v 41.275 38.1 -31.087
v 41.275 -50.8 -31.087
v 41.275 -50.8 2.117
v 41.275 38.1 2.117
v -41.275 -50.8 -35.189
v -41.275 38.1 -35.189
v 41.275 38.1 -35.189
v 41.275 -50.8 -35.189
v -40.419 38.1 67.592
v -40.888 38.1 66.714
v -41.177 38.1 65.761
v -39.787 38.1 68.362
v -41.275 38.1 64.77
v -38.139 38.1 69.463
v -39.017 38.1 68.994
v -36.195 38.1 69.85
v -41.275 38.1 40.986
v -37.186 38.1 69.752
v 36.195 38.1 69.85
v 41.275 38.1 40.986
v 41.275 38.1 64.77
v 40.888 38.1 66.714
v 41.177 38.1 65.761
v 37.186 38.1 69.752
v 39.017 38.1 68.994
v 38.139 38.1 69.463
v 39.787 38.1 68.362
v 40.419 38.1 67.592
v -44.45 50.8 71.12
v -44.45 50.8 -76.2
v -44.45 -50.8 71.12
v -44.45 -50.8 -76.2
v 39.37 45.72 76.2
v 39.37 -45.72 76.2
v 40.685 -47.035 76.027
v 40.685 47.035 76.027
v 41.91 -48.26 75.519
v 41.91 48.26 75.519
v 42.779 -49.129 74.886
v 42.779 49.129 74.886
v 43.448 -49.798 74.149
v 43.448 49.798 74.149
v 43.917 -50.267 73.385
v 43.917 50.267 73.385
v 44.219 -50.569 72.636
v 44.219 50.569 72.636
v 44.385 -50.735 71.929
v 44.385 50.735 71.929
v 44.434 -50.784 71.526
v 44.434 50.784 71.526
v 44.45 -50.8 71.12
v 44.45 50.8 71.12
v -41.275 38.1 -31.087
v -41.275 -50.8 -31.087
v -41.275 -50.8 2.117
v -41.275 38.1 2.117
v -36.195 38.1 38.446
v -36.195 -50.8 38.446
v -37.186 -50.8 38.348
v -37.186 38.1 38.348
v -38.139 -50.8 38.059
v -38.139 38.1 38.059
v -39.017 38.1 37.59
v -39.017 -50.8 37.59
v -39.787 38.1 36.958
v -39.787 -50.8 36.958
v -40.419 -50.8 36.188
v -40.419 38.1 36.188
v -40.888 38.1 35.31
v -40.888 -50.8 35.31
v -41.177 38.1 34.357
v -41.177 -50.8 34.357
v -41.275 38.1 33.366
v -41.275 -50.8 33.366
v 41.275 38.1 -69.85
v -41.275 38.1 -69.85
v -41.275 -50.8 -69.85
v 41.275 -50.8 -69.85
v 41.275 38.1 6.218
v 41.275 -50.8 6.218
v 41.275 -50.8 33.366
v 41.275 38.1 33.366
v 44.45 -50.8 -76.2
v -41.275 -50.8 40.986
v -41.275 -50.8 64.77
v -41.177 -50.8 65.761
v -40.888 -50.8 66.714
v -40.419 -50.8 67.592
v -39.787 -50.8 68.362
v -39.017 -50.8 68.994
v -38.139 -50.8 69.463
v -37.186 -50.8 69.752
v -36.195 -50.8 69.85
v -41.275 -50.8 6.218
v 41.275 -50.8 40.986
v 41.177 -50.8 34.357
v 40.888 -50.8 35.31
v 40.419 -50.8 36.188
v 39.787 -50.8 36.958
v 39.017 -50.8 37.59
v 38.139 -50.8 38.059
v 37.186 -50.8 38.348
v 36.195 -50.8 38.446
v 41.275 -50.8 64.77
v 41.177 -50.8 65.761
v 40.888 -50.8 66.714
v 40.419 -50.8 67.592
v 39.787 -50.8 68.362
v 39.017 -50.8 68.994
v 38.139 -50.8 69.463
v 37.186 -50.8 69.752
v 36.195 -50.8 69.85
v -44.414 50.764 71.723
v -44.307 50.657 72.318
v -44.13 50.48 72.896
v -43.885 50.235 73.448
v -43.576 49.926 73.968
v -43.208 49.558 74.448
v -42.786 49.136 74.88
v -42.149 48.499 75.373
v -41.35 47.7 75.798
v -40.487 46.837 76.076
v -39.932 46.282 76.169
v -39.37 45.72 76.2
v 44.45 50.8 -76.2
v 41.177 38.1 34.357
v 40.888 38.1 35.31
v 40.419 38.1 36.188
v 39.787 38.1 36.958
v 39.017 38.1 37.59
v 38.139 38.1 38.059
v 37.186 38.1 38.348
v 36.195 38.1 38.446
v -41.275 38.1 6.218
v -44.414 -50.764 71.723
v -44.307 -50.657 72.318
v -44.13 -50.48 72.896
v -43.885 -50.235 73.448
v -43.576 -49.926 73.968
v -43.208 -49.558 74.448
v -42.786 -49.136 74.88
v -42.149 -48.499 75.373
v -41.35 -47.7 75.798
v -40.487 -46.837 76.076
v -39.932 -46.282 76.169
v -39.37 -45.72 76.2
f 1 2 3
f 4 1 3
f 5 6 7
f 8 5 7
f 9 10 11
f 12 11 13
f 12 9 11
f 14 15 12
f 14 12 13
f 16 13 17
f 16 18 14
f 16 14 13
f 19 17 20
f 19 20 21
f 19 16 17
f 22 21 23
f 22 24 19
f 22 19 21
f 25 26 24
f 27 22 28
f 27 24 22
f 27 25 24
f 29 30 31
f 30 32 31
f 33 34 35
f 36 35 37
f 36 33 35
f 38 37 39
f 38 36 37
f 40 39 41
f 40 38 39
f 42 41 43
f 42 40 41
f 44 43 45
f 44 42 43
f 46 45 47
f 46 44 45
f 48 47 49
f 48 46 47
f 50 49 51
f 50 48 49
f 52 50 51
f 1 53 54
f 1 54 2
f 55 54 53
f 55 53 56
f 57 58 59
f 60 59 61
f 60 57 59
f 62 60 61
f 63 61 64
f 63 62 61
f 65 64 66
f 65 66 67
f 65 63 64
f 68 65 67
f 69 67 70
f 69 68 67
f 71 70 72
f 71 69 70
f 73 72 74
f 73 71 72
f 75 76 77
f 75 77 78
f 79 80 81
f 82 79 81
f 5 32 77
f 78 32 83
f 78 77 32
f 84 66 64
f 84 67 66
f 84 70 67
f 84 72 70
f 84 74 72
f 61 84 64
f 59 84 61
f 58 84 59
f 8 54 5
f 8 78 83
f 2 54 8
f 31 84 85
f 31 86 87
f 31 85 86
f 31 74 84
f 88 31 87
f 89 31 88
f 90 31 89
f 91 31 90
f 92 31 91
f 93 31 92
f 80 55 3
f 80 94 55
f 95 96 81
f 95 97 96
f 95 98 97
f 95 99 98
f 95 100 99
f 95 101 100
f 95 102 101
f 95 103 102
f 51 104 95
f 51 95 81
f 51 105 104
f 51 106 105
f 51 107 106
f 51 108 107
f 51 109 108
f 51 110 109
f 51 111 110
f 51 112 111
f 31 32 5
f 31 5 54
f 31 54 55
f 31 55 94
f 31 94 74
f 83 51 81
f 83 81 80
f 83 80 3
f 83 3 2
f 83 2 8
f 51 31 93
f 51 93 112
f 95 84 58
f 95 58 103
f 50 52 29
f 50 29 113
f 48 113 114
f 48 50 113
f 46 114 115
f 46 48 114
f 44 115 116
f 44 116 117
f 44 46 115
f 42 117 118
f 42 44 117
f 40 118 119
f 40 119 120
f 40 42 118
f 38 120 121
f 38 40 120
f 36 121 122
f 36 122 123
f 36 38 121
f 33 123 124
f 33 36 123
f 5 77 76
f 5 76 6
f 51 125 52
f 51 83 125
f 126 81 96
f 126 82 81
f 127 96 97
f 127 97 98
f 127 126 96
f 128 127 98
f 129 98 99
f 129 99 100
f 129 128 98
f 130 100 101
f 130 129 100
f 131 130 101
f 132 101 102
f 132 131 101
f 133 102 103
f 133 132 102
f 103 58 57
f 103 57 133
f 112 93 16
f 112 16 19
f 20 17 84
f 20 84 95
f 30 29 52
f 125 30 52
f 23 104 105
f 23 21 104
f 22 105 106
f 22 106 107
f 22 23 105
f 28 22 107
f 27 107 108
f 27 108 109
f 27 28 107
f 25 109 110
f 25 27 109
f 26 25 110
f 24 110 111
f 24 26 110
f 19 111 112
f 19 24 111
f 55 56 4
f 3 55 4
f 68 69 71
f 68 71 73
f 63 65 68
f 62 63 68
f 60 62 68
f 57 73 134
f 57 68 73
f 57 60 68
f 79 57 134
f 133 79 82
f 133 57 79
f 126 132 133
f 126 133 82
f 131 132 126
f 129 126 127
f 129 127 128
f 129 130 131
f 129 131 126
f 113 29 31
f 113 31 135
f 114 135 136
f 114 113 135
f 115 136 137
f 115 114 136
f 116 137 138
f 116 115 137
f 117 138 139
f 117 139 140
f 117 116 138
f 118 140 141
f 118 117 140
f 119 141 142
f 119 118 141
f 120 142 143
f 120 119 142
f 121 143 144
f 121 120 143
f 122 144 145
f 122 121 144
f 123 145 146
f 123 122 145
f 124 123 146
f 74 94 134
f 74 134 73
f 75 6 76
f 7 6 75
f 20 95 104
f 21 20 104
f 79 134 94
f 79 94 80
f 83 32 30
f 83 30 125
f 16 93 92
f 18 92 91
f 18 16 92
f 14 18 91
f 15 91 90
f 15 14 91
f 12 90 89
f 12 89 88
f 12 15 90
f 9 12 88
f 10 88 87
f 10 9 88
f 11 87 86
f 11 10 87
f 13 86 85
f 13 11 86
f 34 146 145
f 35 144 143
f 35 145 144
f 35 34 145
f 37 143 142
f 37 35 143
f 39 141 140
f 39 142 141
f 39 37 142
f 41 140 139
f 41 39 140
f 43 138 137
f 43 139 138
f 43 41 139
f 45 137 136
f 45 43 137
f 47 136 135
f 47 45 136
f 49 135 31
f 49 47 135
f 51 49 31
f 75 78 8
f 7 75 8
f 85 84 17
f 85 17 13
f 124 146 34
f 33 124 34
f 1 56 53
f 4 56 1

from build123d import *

# Parameters (mm, degrees)
F0_W     = 88.9
F0_H     = 152.4
F1_DEPTH = 50.8
F2_W     = 82.55
F2_H     = 28.864218
F2_H_2   = 32.227332
F2_H_3   = 33.203915
F2_H_4   = 34.661213
F3_DEPTH = 88.9
F4_R     = 5.08


with BuildPart() as f1:
    # F0 (on Front) → F1 (new body, symmetric)
    with BuildSketch(Plane.XZ):
        Rectangle(F0_W, F0_H)
    extrude(amount=F1_DEPTH, both=True)

    # F2 (on face) → F3 (cut)
    with BuildSketch(Plane.XZ.offset(50.8)):
        with Locations((0, 55.417891)):
            Rectangle(F2_W, F2_H)
        with Locations((0, 22.332116)):
            Rectangle(F2_W, F2_H_2)
        with Locations((0, -14.485167)):
            Rectangle(F2_W, F2_H_3)
        with Locations((0, -52.519393)):
            Rectangle(F2_W, F2_H_4)
    extrude(amount=-F3_DEPTH, mode=Mode.SUBTRACT)

    # F4
    f4_edges = [f1.edges().sort_by_distance(p)[0] for p in [
        (-44.45, 0, 76.2),
        (44.45, 0, 76.2),
        (0, 50.8, 76.2),
        (0, -50.8, 76.2),
        (-41.275, -6.35, 38.445782),
        (41.275, -6.35, 38.445782),
        (41.275, -6.35, 69.85),
        (-41.275, -6.35, 69.85),
    ]]
    fillet(f4_edges, radius=F4_R)


solid = f1.part
